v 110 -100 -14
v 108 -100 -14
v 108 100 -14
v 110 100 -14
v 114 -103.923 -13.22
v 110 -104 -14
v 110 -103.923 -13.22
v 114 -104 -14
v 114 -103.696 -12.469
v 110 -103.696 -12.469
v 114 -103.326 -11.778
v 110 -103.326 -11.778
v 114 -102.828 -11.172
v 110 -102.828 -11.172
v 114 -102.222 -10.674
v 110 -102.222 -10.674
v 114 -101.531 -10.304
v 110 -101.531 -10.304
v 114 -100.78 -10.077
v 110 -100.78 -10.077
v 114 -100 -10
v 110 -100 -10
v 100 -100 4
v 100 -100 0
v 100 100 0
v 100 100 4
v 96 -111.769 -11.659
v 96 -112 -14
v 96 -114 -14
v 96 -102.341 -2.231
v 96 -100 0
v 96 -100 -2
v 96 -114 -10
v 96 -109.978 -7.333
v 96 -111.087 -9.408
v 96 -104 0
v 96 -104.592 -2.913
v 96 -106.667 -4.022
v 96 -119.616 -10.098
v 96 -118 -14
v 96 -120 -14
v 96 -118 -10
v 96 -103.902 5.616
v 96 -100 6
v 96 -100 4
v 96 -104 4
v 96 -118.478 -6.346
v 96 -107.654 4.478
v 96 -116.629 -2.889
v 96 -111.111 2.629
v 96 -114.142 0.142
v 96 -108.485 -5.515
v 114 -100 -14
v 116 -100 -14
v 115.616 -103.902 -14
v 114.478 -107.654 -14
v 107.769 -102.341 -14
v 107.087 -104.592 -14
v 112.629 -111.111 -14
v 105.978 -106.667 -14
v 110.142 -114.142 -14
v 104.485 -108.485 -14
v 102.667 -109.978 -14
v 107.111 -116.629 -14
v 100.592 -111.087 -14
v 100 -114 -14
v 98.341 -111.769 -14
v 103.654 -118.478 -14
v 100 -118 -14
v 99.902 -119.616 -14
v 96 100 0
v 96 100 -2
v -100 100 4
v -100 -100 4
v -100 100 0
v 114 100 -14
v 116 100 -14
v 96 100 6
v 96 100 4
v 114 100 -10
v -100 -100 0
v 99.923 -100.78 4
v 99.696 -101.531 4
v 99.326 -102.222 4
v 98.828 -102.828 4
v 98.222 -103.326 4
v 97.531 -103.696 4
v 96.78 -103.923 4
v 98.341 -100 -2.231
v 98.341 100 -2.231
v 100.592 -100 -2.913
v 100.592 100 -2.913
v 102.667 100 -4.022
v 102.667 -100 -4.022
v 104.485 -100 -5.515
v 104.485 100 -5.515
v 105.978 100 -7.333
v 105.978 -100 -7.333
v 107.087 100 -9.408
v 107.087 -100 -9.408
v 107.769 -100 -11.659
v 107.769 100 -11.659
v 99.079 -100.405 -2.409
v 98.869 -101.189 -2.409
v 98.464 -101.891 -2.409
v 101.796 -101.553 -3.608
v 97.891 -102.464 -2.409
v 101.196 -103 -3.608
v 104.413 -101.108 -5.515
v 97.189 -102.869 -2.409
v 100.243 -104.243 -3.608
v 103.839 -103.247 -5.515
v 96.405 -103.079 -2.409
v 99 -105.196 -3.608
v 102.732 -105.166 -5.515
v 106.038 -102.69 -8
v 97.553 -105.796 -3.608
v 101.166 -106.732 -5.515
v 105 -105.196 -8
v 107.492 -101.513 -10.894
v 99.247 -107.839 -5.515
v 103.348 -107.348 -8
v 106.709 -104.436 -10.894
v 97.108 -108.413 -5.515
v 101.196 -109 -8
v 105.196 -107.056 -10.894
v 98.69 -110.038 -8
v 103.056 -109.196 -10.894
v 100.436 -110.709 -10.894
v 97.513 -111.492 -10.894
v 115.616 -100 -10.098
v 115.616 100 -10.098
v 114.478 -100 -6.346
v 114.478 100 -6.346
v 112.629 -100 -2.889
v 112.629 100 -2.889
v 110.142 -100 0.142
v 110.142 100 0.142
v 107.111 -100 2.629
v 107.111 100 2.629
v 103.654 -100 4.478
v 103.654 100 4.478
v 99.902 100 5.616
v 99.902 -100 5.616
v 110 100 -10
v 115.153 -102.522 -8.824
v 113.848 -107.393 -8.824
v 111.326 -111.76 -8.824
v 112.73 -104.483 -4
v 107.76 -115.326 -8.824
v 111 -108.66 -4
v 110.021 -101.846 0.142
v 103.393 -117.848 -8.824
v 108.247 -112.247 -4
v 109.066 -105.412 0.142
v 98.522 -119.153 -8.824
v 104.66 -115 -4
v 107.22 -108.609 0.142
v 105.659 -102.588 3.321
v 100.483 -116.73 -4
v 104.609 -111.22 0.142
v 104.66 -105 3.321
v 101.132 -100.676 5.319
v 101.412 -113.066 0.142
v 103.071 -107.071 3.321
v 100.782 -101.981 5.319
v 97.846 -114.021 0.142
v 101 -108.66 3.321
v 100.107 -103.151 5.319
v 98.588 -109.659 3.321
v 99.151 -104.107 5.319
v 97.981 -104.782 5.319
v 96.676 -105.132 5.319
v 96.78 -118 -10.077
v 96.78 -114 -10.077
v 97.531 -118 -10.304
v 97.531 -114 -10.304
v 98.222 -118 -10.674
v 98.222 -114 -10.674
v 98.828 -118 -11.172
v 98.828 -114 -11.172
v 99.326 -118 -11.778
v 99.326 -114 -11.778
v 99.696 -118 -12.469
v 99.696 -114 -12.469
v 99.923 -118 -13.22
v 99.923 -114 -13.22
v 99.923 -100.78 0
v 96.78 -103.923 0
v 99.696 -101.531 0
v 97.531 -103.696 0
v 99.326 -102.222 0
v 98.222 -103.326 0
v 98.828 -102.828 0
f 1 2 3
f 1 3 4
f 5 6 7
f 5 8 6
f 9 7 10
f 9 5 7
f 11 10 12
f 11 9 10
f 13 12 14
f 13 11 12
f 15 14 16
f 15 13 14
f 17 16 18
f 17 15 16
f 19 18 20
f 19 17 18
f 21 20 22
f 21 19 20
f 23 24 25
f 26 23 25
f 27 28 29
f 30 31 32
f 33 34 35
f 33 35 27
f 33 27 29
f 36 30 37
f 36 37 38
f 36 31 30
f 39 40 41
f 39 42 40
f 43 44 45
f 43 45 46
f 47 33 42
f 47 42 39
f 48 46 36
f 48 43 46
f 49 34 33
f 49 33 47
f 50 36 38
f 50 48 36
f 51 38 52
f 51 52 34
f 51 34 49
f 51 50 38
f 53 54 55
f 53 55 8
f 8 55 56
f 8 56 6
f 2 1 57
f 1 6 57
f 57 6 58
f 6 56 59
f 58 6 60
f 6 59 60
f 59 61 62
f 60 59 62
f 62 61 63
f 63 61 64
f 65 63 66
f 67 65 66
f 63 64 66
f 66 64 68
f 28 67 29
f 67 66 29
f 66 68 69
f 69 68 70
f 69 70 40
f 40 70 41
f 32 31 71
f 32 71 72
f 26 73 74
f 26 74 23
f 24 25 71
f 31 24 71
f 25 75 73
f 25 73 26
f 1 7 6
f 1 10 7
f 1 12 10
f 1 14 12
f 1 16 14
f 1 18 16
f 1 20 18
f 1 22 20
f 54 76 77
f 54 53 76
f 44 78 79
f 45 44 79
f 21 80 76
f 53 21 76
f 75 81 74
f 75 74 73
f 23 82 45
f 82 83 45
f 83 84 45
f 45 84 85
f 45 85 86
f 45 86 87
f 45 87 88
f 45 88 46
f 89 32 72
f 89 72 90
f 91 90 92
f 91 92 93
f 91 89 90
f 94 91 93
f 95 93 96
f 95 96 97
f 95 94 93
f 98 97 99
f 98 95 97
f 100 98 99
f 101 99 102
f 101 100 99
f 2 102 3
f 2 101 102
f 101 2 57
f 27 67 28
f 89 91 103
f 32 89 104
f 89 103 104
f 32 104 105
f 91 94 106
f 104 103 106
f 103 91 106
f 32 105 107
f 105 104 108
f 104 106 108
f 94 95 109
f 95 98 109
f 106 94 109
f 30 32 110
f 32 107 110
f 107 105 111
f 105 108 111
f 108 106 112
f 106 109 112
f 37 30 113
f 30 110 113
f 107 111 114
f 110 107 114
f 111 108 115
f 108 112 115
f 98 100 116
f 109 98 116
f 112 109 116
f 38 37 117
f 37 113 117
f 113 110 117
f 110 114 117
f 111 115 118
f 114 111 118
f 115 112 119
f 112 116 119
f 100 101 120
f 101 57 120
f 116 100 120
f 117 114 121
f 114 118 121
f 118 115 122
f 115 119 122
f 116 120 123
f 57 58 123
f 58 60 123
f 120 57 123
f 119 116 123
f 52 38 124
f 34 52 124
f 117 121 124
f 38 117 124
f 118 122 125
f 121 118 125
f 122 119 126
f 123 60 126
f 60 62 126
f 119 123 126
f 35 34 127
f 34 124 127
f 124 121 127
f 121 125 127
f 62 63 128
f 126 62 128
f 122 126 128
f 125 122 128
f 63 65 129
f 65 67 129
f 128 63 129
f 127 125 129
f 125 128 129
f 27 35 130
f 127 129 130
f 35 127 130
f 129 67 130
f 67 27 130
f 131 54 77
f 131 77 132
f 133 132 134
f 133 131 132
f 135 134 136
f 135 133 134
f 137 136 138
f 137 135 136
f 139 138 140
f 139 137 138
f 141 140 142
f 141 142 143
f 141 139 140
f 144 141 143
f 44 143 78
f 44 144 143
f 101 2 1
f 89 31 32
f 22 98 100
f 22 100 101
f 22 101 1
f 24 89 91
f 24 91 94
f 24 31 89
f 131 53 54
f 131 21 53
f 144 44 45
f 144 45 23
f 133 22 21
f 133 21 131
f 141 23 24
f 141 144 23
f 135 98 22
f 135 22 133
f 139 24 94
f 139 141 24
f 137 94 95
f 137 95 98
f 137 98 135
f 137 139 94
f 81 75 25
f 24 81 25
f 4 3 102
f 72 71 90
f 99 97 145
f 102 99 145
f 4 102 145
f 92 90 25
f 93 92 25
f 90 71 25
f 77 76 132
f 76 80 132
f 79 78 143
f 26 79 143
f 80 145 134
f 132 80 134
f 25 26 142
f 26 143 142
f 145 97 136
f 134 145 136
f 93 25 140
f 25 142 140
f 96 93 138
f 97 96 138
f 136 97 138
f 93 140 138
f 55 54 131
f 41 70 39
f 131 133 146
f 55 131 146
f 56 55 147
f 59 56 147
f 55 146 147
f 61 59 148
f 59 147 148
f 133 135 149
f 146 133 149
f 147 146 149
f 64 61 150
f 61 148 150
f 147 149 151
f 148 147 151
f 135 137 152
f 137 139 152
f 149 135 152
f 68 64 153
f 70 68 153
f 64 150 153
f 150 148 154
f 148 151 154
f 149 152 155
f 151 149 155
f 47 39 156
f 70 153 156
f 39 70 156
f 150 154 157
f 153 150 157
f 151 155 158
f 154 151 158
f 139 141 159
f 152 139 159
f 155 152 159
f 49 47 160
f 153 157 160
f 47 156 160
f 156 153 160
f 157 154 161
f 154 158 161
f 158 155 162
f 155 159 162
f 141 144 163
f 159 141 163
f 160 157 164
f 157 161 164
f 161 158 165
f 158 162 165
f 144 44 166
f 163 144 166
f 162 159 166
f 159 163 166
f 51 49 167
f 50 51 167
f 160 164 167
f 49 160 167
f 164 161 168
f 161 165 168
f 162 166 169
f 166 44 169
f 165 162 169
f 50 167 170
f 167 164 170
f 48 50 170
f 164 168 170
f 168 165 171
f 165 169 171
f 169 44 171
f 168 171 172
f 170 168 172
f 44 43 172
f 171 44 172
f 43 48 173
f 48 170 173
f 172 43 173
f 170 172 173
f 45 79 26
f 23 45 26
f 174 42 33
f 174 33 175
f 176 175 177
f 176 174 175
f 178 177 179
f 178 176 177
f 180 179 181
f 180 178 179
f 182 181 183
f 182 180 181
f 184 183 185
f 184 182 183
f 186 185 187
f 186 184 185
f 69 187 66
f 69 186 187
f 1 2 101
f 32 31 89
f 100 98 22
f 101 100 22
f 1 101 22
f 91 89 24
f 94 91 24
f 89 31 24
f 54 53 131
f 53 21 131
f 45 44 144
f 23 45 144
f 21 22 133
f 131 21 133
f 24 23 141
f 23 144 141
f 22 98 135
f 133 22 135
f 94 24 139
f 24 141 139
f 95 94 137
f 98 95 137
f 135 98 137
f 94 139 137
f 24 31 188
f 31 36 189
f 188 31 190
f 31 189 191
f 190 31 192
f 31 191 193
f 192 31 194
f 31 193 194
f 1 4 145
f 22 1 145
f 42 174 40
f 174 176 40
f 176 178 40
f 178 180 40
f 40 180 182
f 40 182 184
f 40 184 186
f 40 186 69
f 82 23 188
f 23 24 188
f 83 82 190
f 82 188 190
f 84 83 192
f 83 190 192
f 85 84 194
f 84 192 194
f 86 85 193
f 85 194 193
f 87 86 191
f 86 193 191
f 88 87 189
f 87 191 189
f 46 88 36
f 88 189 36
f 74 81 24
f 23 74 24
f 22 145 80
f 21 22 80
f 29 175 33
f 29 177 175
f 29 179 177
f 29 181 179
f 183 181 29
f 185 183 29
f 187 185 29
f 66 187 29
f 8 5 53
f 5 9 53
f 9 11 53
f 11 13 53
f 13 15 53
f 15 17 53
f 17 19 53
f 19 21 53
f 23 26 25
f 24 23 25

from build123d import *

# Parameters (mm, degrees)
F0_W     = 200
F0_H     = 200
F1_DEPTH = 4
F3_DEPTH = 100
F4_W     = 4
F4_H     = 4
F5_ANGLE = 90
F6_W     = 4
F6_H     = 4
F8_W     = 4
F8_H     = 4


with BuildPart() as f1:
    # F0 (on Top) → F1 (new body)
    with BuildSketch(Plane.XY):
        Rectangle(F0_W, F0_H)
    extrude(amount=F1_DEPTH)


with BuildPart() as f3:
    # F2 (on Front) → F3 (new body, symmetric)
    with BuildSketch(Plane.XZ):
        with BuildLine():
            Line((114, -14), (116, -14))
            ThreePointArc((116, -14), (110.1421356237, 0.1421356237), (96, 6))
            Line((96, 6), (96, 4))
            Line((96, 4), (100, 4))
            Line((100, 4), (100, 0))
            Line((100, 0), (96, 0))
            Line((96, 0), (96, -2))
            ThreePointArc((96, -2), (104.4852813742, -5.5147186258), (108, -14))
            Line((108, -14), (110, -14))
            Line((110, -14), (110, -10))
            Line((110, -10), (114, -10))
            Line((114, -10), (114, -14))
        make_face()
    extrude(amount=F3_DEPTH, both=True)


with BuildPart() as f5:
    # F4 (on face) → F5 (revolve)
    with BuildSketch(Plane.XZ.offset(100)):
        with BuildLine():
            Line((114, -10), (114, -14))
            Line((114, -14), (116, -14))
            ThreePointArc((116, -14), (110.1421356237, 0.1421356237), (96, 6))
            Line((96, 6), (96, 4))
            Line((96, 4), (100, 4))
            Line((100, 4), (100, 0))
            Line((100, 0), (96, 0))
            Line((96, 0), (96, -2))
            ThreePointArc((96, -2), (104.4852813742, -5.5147186258), (108, -14))
            Line((108, -14), (110, -14))
            Line((110, -14), (110, -10))
            Line((110, -10), (114, -10))
        make_face()
        with Locations((112, -12)):
            Rectangle(F4_W, F4_H)
    revolve(axis=Axis((96, -100, 5), (0, 0, -1)), revolution_arc=F5_ANGLE)

    # F6 (on face) → F7 (revolve, cut)
    with BuildSketch(Plane(origin=(96, 0, 0), x_dir=(0, -1, 0), z_dir=(-1, 0, 0))):
        with Locations((116, -12)):
            Rectangle(F6_W, F6_H)
    revolve(axis=Axis((96, -113, -14), (0, 1, 0)), mode=Mode.SUBTRACT)

    # F8 (on face) → F9 (revolve, cut)
    with BuildSketch(Plane.XZ.offset(100)):
        with Locations((112, -12)):
            Rectangle(F8_W, F8_H)
    revolve(axis=Axis((109, -100, -14), (-1, 0, 0)), mode=Mode.SUBTRACT)


solid = Compound([f1.part, f3.part, f5.part])
